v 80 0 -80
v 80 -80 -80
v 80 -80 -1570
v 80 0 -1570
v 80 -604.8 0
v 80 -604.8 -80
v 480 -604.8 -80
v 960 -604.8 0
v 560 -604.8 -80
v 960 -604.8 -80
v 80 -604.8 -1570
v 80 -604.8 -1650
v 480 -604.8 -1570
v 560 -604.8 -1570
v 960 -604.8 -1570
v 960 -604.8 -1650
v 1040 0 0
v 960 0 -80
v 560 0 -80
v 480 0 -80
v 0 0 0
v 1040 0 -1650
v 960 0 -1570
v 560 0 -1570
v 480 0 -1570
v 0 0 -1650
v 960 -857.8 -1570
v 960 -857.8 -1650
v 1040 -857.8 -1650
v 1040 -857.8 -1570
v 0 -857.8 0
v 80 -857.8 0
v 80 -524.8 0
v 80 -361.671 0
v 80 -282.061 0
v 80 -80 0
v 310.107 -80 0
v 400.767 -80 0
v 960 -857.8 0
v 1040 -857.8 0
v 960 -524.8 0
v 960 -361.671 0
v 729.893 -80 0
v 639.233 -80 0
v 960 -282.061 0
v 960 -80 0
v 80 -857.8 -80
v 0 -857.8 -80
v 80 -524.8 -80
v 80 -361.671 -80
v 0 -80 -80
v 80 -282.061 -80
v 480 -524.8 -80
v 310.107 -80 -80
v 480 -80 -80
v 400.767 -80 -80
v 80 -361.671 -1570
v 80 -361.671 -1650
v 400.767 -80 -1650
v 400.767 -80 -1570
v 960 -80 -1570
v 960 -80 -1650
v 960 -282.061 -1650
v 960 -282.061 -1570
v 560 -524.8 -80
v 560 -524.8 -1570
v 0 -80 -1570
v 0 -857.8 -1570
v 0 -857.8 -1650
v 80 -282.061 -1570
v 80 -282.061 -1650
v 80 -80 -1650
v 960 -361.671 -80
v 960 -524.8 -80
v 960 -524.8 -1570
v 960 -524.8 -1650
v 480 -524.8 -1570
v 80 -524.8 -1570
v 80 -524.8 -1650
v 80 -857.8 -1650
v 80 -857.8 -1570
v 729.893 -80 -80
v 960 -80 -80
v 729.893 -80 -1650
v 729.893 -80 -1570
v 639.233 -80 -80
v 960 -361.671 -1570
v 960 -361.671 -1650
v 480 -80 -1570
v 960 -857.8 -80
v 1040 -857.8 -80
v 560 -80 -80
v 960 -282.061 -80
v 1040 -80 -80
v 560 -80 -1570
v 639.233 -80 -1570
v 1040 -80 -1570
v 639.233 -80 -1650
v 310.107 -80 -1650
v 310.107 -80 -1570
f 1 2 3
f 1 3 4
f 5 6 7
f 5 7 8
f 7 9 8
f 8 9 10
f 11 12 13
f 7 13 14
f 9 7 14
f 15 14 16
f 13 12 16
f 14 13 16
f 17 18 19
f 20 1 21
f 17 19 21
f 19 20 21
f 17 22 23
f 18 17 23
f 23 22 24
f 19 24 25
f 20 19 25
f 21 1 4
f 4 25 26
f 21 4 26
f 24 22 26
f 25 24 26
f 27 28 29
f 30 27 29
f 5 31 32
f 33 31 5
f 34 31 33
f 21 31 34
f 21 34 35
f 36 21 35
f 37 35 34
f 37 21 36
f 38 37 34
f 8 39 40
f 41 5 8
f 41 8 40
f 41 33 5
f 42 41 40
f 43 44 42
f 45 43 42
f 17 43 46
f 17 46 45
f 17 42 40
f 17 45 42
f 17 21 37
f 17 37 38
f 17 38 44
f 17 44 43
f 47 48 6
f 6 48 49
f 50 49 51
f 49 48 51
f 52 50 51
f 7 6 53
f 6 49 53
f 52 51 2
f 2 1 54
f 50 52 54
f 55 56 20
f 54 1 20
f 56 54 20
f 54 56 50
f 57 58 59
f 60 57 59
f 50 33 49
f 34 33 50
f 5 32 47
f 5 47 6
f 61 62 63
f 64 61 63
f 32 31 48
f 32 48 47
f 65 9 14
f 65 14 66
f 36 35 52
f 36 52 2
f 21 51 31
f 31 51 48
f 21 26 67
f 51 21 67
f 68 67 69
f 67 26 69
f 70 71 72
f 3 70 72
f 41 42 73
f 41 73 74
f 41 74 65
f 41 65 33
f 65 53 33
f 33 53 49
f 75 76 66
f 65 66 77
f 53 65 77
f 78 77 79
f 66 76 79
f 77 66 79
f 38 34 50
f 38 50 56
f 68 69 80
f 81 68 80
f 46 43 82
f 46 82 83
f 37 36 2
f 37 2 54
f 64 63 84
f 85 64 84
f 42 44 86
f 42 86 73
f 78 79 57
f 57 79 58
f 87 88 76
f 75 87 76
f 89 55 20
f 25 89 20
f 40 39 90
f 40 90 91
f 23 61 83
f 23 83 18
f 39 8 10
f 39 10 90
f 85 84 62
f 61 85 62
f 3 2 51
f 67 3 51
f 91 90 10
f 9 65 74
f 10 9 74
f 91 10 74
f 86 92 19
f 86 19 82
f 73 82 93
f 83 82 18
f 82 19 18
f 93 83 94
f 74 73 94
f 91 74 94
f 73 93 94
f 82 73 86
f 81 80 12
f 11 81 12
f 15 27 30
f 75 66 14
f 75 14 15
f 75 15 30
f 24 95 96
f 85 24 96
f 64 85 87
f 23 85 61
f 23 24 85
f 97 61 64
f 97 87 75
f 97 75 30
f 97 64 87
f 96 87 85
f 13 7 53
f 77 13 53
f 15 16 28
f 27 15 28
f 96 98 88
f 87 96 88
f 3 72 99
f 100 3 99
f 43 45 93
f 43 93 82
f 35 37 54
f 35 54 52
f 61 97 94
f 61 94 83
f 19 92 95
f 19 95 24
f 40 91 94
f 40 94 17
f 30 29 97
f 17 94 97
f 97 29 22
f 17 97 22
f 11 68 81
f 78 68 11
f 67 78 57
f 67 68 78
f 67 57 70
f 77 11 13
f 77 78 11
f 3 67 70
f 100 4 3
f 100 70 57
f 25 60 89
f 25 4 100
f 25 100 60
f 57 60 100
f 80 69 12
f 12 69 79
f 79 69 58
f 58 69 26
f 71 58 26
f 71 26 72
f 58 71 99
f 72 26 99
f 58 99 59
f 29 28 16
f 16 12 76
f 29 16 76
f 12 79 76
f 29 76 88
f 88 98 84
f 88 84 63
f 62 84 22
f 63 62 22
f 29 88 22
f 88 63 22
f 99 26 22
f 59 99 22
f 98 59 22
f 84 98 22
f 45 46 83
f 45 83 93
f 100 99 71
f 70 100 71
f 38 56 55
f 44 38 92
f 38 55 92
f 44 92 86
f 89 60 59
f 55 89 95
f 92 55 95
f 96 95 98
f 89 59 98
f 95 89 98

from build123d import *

# Parameters (mm, degrees)
BOSS_EXTRUDE1_DEPTH = 80
SKETCH2_W           = 80
SKETCH2_H           = 80
BOSS_EXTRUDE2_DEPTH = 790


with BuildPart() as part:
    # Sketch1 → Boss-Extrude1 (new body)
    with BuildSketch(Plane.XY):
        Polygon((1040, 0), (0, 0), (0, -857.8), (80, -857.8), (80, -604.8), (960, -604.8), (960, -857.8), (1040, -857.8), align=None)
        Polygon((960, -524.8), (80, -524.8), (80, -361.670887123), (400.767069293, -80), (639.232930707, -80), (960, -361.670887123), align=None, mode=Mode.SUBTRACT)
        Polygon((729.892680056, -80), (960, -80), (960, -282.061056595), align=None, mode=Mode.SUBTRACT)
        Polygon((80, -282.061056595), (80, -80), (310.107319944, -80), align=None, mode=Mode.SUBTRACT)
    boss_extrude1 = extrude(amount=-BOSS_EXTRUDE1_DEPTH)

    # Sketch2 → Boss-Extrude2 (add)
    with BuildSketch(Plane(origin=(0, 0, -80), x_dir=(-1, 0, 0), z_dir=(0, 0, -1))):
        with Locations((-1000, -40)):
            Rectangle(SKETCH2_W, SKETCH2_H)
        with Locations((-40, -40)):
            Rectangle(SKETCH2_W, SKETCH2_H)
        with Locations((-520, -564.8)):
            Rectangle(SKETCH2_W, SKETCH2_H)
        with Locations((-520, -40)):
            Rectangle(SKETCH2_W, SKETCH2_H)
    boss_extrude2 = extrude(amount=BOSS_EXTRUDE2_DEPTH)

    # Mirror2: Boss-Extrude2 across plane
    add(boss_extrude2.mirror(Plane.XY.offset(-825)))

    # Mirror3: Boss-Extrude1 across plane
    add(boss_extrude1.mirror(Plane.XY.offset(-825)))


solid = part.part
